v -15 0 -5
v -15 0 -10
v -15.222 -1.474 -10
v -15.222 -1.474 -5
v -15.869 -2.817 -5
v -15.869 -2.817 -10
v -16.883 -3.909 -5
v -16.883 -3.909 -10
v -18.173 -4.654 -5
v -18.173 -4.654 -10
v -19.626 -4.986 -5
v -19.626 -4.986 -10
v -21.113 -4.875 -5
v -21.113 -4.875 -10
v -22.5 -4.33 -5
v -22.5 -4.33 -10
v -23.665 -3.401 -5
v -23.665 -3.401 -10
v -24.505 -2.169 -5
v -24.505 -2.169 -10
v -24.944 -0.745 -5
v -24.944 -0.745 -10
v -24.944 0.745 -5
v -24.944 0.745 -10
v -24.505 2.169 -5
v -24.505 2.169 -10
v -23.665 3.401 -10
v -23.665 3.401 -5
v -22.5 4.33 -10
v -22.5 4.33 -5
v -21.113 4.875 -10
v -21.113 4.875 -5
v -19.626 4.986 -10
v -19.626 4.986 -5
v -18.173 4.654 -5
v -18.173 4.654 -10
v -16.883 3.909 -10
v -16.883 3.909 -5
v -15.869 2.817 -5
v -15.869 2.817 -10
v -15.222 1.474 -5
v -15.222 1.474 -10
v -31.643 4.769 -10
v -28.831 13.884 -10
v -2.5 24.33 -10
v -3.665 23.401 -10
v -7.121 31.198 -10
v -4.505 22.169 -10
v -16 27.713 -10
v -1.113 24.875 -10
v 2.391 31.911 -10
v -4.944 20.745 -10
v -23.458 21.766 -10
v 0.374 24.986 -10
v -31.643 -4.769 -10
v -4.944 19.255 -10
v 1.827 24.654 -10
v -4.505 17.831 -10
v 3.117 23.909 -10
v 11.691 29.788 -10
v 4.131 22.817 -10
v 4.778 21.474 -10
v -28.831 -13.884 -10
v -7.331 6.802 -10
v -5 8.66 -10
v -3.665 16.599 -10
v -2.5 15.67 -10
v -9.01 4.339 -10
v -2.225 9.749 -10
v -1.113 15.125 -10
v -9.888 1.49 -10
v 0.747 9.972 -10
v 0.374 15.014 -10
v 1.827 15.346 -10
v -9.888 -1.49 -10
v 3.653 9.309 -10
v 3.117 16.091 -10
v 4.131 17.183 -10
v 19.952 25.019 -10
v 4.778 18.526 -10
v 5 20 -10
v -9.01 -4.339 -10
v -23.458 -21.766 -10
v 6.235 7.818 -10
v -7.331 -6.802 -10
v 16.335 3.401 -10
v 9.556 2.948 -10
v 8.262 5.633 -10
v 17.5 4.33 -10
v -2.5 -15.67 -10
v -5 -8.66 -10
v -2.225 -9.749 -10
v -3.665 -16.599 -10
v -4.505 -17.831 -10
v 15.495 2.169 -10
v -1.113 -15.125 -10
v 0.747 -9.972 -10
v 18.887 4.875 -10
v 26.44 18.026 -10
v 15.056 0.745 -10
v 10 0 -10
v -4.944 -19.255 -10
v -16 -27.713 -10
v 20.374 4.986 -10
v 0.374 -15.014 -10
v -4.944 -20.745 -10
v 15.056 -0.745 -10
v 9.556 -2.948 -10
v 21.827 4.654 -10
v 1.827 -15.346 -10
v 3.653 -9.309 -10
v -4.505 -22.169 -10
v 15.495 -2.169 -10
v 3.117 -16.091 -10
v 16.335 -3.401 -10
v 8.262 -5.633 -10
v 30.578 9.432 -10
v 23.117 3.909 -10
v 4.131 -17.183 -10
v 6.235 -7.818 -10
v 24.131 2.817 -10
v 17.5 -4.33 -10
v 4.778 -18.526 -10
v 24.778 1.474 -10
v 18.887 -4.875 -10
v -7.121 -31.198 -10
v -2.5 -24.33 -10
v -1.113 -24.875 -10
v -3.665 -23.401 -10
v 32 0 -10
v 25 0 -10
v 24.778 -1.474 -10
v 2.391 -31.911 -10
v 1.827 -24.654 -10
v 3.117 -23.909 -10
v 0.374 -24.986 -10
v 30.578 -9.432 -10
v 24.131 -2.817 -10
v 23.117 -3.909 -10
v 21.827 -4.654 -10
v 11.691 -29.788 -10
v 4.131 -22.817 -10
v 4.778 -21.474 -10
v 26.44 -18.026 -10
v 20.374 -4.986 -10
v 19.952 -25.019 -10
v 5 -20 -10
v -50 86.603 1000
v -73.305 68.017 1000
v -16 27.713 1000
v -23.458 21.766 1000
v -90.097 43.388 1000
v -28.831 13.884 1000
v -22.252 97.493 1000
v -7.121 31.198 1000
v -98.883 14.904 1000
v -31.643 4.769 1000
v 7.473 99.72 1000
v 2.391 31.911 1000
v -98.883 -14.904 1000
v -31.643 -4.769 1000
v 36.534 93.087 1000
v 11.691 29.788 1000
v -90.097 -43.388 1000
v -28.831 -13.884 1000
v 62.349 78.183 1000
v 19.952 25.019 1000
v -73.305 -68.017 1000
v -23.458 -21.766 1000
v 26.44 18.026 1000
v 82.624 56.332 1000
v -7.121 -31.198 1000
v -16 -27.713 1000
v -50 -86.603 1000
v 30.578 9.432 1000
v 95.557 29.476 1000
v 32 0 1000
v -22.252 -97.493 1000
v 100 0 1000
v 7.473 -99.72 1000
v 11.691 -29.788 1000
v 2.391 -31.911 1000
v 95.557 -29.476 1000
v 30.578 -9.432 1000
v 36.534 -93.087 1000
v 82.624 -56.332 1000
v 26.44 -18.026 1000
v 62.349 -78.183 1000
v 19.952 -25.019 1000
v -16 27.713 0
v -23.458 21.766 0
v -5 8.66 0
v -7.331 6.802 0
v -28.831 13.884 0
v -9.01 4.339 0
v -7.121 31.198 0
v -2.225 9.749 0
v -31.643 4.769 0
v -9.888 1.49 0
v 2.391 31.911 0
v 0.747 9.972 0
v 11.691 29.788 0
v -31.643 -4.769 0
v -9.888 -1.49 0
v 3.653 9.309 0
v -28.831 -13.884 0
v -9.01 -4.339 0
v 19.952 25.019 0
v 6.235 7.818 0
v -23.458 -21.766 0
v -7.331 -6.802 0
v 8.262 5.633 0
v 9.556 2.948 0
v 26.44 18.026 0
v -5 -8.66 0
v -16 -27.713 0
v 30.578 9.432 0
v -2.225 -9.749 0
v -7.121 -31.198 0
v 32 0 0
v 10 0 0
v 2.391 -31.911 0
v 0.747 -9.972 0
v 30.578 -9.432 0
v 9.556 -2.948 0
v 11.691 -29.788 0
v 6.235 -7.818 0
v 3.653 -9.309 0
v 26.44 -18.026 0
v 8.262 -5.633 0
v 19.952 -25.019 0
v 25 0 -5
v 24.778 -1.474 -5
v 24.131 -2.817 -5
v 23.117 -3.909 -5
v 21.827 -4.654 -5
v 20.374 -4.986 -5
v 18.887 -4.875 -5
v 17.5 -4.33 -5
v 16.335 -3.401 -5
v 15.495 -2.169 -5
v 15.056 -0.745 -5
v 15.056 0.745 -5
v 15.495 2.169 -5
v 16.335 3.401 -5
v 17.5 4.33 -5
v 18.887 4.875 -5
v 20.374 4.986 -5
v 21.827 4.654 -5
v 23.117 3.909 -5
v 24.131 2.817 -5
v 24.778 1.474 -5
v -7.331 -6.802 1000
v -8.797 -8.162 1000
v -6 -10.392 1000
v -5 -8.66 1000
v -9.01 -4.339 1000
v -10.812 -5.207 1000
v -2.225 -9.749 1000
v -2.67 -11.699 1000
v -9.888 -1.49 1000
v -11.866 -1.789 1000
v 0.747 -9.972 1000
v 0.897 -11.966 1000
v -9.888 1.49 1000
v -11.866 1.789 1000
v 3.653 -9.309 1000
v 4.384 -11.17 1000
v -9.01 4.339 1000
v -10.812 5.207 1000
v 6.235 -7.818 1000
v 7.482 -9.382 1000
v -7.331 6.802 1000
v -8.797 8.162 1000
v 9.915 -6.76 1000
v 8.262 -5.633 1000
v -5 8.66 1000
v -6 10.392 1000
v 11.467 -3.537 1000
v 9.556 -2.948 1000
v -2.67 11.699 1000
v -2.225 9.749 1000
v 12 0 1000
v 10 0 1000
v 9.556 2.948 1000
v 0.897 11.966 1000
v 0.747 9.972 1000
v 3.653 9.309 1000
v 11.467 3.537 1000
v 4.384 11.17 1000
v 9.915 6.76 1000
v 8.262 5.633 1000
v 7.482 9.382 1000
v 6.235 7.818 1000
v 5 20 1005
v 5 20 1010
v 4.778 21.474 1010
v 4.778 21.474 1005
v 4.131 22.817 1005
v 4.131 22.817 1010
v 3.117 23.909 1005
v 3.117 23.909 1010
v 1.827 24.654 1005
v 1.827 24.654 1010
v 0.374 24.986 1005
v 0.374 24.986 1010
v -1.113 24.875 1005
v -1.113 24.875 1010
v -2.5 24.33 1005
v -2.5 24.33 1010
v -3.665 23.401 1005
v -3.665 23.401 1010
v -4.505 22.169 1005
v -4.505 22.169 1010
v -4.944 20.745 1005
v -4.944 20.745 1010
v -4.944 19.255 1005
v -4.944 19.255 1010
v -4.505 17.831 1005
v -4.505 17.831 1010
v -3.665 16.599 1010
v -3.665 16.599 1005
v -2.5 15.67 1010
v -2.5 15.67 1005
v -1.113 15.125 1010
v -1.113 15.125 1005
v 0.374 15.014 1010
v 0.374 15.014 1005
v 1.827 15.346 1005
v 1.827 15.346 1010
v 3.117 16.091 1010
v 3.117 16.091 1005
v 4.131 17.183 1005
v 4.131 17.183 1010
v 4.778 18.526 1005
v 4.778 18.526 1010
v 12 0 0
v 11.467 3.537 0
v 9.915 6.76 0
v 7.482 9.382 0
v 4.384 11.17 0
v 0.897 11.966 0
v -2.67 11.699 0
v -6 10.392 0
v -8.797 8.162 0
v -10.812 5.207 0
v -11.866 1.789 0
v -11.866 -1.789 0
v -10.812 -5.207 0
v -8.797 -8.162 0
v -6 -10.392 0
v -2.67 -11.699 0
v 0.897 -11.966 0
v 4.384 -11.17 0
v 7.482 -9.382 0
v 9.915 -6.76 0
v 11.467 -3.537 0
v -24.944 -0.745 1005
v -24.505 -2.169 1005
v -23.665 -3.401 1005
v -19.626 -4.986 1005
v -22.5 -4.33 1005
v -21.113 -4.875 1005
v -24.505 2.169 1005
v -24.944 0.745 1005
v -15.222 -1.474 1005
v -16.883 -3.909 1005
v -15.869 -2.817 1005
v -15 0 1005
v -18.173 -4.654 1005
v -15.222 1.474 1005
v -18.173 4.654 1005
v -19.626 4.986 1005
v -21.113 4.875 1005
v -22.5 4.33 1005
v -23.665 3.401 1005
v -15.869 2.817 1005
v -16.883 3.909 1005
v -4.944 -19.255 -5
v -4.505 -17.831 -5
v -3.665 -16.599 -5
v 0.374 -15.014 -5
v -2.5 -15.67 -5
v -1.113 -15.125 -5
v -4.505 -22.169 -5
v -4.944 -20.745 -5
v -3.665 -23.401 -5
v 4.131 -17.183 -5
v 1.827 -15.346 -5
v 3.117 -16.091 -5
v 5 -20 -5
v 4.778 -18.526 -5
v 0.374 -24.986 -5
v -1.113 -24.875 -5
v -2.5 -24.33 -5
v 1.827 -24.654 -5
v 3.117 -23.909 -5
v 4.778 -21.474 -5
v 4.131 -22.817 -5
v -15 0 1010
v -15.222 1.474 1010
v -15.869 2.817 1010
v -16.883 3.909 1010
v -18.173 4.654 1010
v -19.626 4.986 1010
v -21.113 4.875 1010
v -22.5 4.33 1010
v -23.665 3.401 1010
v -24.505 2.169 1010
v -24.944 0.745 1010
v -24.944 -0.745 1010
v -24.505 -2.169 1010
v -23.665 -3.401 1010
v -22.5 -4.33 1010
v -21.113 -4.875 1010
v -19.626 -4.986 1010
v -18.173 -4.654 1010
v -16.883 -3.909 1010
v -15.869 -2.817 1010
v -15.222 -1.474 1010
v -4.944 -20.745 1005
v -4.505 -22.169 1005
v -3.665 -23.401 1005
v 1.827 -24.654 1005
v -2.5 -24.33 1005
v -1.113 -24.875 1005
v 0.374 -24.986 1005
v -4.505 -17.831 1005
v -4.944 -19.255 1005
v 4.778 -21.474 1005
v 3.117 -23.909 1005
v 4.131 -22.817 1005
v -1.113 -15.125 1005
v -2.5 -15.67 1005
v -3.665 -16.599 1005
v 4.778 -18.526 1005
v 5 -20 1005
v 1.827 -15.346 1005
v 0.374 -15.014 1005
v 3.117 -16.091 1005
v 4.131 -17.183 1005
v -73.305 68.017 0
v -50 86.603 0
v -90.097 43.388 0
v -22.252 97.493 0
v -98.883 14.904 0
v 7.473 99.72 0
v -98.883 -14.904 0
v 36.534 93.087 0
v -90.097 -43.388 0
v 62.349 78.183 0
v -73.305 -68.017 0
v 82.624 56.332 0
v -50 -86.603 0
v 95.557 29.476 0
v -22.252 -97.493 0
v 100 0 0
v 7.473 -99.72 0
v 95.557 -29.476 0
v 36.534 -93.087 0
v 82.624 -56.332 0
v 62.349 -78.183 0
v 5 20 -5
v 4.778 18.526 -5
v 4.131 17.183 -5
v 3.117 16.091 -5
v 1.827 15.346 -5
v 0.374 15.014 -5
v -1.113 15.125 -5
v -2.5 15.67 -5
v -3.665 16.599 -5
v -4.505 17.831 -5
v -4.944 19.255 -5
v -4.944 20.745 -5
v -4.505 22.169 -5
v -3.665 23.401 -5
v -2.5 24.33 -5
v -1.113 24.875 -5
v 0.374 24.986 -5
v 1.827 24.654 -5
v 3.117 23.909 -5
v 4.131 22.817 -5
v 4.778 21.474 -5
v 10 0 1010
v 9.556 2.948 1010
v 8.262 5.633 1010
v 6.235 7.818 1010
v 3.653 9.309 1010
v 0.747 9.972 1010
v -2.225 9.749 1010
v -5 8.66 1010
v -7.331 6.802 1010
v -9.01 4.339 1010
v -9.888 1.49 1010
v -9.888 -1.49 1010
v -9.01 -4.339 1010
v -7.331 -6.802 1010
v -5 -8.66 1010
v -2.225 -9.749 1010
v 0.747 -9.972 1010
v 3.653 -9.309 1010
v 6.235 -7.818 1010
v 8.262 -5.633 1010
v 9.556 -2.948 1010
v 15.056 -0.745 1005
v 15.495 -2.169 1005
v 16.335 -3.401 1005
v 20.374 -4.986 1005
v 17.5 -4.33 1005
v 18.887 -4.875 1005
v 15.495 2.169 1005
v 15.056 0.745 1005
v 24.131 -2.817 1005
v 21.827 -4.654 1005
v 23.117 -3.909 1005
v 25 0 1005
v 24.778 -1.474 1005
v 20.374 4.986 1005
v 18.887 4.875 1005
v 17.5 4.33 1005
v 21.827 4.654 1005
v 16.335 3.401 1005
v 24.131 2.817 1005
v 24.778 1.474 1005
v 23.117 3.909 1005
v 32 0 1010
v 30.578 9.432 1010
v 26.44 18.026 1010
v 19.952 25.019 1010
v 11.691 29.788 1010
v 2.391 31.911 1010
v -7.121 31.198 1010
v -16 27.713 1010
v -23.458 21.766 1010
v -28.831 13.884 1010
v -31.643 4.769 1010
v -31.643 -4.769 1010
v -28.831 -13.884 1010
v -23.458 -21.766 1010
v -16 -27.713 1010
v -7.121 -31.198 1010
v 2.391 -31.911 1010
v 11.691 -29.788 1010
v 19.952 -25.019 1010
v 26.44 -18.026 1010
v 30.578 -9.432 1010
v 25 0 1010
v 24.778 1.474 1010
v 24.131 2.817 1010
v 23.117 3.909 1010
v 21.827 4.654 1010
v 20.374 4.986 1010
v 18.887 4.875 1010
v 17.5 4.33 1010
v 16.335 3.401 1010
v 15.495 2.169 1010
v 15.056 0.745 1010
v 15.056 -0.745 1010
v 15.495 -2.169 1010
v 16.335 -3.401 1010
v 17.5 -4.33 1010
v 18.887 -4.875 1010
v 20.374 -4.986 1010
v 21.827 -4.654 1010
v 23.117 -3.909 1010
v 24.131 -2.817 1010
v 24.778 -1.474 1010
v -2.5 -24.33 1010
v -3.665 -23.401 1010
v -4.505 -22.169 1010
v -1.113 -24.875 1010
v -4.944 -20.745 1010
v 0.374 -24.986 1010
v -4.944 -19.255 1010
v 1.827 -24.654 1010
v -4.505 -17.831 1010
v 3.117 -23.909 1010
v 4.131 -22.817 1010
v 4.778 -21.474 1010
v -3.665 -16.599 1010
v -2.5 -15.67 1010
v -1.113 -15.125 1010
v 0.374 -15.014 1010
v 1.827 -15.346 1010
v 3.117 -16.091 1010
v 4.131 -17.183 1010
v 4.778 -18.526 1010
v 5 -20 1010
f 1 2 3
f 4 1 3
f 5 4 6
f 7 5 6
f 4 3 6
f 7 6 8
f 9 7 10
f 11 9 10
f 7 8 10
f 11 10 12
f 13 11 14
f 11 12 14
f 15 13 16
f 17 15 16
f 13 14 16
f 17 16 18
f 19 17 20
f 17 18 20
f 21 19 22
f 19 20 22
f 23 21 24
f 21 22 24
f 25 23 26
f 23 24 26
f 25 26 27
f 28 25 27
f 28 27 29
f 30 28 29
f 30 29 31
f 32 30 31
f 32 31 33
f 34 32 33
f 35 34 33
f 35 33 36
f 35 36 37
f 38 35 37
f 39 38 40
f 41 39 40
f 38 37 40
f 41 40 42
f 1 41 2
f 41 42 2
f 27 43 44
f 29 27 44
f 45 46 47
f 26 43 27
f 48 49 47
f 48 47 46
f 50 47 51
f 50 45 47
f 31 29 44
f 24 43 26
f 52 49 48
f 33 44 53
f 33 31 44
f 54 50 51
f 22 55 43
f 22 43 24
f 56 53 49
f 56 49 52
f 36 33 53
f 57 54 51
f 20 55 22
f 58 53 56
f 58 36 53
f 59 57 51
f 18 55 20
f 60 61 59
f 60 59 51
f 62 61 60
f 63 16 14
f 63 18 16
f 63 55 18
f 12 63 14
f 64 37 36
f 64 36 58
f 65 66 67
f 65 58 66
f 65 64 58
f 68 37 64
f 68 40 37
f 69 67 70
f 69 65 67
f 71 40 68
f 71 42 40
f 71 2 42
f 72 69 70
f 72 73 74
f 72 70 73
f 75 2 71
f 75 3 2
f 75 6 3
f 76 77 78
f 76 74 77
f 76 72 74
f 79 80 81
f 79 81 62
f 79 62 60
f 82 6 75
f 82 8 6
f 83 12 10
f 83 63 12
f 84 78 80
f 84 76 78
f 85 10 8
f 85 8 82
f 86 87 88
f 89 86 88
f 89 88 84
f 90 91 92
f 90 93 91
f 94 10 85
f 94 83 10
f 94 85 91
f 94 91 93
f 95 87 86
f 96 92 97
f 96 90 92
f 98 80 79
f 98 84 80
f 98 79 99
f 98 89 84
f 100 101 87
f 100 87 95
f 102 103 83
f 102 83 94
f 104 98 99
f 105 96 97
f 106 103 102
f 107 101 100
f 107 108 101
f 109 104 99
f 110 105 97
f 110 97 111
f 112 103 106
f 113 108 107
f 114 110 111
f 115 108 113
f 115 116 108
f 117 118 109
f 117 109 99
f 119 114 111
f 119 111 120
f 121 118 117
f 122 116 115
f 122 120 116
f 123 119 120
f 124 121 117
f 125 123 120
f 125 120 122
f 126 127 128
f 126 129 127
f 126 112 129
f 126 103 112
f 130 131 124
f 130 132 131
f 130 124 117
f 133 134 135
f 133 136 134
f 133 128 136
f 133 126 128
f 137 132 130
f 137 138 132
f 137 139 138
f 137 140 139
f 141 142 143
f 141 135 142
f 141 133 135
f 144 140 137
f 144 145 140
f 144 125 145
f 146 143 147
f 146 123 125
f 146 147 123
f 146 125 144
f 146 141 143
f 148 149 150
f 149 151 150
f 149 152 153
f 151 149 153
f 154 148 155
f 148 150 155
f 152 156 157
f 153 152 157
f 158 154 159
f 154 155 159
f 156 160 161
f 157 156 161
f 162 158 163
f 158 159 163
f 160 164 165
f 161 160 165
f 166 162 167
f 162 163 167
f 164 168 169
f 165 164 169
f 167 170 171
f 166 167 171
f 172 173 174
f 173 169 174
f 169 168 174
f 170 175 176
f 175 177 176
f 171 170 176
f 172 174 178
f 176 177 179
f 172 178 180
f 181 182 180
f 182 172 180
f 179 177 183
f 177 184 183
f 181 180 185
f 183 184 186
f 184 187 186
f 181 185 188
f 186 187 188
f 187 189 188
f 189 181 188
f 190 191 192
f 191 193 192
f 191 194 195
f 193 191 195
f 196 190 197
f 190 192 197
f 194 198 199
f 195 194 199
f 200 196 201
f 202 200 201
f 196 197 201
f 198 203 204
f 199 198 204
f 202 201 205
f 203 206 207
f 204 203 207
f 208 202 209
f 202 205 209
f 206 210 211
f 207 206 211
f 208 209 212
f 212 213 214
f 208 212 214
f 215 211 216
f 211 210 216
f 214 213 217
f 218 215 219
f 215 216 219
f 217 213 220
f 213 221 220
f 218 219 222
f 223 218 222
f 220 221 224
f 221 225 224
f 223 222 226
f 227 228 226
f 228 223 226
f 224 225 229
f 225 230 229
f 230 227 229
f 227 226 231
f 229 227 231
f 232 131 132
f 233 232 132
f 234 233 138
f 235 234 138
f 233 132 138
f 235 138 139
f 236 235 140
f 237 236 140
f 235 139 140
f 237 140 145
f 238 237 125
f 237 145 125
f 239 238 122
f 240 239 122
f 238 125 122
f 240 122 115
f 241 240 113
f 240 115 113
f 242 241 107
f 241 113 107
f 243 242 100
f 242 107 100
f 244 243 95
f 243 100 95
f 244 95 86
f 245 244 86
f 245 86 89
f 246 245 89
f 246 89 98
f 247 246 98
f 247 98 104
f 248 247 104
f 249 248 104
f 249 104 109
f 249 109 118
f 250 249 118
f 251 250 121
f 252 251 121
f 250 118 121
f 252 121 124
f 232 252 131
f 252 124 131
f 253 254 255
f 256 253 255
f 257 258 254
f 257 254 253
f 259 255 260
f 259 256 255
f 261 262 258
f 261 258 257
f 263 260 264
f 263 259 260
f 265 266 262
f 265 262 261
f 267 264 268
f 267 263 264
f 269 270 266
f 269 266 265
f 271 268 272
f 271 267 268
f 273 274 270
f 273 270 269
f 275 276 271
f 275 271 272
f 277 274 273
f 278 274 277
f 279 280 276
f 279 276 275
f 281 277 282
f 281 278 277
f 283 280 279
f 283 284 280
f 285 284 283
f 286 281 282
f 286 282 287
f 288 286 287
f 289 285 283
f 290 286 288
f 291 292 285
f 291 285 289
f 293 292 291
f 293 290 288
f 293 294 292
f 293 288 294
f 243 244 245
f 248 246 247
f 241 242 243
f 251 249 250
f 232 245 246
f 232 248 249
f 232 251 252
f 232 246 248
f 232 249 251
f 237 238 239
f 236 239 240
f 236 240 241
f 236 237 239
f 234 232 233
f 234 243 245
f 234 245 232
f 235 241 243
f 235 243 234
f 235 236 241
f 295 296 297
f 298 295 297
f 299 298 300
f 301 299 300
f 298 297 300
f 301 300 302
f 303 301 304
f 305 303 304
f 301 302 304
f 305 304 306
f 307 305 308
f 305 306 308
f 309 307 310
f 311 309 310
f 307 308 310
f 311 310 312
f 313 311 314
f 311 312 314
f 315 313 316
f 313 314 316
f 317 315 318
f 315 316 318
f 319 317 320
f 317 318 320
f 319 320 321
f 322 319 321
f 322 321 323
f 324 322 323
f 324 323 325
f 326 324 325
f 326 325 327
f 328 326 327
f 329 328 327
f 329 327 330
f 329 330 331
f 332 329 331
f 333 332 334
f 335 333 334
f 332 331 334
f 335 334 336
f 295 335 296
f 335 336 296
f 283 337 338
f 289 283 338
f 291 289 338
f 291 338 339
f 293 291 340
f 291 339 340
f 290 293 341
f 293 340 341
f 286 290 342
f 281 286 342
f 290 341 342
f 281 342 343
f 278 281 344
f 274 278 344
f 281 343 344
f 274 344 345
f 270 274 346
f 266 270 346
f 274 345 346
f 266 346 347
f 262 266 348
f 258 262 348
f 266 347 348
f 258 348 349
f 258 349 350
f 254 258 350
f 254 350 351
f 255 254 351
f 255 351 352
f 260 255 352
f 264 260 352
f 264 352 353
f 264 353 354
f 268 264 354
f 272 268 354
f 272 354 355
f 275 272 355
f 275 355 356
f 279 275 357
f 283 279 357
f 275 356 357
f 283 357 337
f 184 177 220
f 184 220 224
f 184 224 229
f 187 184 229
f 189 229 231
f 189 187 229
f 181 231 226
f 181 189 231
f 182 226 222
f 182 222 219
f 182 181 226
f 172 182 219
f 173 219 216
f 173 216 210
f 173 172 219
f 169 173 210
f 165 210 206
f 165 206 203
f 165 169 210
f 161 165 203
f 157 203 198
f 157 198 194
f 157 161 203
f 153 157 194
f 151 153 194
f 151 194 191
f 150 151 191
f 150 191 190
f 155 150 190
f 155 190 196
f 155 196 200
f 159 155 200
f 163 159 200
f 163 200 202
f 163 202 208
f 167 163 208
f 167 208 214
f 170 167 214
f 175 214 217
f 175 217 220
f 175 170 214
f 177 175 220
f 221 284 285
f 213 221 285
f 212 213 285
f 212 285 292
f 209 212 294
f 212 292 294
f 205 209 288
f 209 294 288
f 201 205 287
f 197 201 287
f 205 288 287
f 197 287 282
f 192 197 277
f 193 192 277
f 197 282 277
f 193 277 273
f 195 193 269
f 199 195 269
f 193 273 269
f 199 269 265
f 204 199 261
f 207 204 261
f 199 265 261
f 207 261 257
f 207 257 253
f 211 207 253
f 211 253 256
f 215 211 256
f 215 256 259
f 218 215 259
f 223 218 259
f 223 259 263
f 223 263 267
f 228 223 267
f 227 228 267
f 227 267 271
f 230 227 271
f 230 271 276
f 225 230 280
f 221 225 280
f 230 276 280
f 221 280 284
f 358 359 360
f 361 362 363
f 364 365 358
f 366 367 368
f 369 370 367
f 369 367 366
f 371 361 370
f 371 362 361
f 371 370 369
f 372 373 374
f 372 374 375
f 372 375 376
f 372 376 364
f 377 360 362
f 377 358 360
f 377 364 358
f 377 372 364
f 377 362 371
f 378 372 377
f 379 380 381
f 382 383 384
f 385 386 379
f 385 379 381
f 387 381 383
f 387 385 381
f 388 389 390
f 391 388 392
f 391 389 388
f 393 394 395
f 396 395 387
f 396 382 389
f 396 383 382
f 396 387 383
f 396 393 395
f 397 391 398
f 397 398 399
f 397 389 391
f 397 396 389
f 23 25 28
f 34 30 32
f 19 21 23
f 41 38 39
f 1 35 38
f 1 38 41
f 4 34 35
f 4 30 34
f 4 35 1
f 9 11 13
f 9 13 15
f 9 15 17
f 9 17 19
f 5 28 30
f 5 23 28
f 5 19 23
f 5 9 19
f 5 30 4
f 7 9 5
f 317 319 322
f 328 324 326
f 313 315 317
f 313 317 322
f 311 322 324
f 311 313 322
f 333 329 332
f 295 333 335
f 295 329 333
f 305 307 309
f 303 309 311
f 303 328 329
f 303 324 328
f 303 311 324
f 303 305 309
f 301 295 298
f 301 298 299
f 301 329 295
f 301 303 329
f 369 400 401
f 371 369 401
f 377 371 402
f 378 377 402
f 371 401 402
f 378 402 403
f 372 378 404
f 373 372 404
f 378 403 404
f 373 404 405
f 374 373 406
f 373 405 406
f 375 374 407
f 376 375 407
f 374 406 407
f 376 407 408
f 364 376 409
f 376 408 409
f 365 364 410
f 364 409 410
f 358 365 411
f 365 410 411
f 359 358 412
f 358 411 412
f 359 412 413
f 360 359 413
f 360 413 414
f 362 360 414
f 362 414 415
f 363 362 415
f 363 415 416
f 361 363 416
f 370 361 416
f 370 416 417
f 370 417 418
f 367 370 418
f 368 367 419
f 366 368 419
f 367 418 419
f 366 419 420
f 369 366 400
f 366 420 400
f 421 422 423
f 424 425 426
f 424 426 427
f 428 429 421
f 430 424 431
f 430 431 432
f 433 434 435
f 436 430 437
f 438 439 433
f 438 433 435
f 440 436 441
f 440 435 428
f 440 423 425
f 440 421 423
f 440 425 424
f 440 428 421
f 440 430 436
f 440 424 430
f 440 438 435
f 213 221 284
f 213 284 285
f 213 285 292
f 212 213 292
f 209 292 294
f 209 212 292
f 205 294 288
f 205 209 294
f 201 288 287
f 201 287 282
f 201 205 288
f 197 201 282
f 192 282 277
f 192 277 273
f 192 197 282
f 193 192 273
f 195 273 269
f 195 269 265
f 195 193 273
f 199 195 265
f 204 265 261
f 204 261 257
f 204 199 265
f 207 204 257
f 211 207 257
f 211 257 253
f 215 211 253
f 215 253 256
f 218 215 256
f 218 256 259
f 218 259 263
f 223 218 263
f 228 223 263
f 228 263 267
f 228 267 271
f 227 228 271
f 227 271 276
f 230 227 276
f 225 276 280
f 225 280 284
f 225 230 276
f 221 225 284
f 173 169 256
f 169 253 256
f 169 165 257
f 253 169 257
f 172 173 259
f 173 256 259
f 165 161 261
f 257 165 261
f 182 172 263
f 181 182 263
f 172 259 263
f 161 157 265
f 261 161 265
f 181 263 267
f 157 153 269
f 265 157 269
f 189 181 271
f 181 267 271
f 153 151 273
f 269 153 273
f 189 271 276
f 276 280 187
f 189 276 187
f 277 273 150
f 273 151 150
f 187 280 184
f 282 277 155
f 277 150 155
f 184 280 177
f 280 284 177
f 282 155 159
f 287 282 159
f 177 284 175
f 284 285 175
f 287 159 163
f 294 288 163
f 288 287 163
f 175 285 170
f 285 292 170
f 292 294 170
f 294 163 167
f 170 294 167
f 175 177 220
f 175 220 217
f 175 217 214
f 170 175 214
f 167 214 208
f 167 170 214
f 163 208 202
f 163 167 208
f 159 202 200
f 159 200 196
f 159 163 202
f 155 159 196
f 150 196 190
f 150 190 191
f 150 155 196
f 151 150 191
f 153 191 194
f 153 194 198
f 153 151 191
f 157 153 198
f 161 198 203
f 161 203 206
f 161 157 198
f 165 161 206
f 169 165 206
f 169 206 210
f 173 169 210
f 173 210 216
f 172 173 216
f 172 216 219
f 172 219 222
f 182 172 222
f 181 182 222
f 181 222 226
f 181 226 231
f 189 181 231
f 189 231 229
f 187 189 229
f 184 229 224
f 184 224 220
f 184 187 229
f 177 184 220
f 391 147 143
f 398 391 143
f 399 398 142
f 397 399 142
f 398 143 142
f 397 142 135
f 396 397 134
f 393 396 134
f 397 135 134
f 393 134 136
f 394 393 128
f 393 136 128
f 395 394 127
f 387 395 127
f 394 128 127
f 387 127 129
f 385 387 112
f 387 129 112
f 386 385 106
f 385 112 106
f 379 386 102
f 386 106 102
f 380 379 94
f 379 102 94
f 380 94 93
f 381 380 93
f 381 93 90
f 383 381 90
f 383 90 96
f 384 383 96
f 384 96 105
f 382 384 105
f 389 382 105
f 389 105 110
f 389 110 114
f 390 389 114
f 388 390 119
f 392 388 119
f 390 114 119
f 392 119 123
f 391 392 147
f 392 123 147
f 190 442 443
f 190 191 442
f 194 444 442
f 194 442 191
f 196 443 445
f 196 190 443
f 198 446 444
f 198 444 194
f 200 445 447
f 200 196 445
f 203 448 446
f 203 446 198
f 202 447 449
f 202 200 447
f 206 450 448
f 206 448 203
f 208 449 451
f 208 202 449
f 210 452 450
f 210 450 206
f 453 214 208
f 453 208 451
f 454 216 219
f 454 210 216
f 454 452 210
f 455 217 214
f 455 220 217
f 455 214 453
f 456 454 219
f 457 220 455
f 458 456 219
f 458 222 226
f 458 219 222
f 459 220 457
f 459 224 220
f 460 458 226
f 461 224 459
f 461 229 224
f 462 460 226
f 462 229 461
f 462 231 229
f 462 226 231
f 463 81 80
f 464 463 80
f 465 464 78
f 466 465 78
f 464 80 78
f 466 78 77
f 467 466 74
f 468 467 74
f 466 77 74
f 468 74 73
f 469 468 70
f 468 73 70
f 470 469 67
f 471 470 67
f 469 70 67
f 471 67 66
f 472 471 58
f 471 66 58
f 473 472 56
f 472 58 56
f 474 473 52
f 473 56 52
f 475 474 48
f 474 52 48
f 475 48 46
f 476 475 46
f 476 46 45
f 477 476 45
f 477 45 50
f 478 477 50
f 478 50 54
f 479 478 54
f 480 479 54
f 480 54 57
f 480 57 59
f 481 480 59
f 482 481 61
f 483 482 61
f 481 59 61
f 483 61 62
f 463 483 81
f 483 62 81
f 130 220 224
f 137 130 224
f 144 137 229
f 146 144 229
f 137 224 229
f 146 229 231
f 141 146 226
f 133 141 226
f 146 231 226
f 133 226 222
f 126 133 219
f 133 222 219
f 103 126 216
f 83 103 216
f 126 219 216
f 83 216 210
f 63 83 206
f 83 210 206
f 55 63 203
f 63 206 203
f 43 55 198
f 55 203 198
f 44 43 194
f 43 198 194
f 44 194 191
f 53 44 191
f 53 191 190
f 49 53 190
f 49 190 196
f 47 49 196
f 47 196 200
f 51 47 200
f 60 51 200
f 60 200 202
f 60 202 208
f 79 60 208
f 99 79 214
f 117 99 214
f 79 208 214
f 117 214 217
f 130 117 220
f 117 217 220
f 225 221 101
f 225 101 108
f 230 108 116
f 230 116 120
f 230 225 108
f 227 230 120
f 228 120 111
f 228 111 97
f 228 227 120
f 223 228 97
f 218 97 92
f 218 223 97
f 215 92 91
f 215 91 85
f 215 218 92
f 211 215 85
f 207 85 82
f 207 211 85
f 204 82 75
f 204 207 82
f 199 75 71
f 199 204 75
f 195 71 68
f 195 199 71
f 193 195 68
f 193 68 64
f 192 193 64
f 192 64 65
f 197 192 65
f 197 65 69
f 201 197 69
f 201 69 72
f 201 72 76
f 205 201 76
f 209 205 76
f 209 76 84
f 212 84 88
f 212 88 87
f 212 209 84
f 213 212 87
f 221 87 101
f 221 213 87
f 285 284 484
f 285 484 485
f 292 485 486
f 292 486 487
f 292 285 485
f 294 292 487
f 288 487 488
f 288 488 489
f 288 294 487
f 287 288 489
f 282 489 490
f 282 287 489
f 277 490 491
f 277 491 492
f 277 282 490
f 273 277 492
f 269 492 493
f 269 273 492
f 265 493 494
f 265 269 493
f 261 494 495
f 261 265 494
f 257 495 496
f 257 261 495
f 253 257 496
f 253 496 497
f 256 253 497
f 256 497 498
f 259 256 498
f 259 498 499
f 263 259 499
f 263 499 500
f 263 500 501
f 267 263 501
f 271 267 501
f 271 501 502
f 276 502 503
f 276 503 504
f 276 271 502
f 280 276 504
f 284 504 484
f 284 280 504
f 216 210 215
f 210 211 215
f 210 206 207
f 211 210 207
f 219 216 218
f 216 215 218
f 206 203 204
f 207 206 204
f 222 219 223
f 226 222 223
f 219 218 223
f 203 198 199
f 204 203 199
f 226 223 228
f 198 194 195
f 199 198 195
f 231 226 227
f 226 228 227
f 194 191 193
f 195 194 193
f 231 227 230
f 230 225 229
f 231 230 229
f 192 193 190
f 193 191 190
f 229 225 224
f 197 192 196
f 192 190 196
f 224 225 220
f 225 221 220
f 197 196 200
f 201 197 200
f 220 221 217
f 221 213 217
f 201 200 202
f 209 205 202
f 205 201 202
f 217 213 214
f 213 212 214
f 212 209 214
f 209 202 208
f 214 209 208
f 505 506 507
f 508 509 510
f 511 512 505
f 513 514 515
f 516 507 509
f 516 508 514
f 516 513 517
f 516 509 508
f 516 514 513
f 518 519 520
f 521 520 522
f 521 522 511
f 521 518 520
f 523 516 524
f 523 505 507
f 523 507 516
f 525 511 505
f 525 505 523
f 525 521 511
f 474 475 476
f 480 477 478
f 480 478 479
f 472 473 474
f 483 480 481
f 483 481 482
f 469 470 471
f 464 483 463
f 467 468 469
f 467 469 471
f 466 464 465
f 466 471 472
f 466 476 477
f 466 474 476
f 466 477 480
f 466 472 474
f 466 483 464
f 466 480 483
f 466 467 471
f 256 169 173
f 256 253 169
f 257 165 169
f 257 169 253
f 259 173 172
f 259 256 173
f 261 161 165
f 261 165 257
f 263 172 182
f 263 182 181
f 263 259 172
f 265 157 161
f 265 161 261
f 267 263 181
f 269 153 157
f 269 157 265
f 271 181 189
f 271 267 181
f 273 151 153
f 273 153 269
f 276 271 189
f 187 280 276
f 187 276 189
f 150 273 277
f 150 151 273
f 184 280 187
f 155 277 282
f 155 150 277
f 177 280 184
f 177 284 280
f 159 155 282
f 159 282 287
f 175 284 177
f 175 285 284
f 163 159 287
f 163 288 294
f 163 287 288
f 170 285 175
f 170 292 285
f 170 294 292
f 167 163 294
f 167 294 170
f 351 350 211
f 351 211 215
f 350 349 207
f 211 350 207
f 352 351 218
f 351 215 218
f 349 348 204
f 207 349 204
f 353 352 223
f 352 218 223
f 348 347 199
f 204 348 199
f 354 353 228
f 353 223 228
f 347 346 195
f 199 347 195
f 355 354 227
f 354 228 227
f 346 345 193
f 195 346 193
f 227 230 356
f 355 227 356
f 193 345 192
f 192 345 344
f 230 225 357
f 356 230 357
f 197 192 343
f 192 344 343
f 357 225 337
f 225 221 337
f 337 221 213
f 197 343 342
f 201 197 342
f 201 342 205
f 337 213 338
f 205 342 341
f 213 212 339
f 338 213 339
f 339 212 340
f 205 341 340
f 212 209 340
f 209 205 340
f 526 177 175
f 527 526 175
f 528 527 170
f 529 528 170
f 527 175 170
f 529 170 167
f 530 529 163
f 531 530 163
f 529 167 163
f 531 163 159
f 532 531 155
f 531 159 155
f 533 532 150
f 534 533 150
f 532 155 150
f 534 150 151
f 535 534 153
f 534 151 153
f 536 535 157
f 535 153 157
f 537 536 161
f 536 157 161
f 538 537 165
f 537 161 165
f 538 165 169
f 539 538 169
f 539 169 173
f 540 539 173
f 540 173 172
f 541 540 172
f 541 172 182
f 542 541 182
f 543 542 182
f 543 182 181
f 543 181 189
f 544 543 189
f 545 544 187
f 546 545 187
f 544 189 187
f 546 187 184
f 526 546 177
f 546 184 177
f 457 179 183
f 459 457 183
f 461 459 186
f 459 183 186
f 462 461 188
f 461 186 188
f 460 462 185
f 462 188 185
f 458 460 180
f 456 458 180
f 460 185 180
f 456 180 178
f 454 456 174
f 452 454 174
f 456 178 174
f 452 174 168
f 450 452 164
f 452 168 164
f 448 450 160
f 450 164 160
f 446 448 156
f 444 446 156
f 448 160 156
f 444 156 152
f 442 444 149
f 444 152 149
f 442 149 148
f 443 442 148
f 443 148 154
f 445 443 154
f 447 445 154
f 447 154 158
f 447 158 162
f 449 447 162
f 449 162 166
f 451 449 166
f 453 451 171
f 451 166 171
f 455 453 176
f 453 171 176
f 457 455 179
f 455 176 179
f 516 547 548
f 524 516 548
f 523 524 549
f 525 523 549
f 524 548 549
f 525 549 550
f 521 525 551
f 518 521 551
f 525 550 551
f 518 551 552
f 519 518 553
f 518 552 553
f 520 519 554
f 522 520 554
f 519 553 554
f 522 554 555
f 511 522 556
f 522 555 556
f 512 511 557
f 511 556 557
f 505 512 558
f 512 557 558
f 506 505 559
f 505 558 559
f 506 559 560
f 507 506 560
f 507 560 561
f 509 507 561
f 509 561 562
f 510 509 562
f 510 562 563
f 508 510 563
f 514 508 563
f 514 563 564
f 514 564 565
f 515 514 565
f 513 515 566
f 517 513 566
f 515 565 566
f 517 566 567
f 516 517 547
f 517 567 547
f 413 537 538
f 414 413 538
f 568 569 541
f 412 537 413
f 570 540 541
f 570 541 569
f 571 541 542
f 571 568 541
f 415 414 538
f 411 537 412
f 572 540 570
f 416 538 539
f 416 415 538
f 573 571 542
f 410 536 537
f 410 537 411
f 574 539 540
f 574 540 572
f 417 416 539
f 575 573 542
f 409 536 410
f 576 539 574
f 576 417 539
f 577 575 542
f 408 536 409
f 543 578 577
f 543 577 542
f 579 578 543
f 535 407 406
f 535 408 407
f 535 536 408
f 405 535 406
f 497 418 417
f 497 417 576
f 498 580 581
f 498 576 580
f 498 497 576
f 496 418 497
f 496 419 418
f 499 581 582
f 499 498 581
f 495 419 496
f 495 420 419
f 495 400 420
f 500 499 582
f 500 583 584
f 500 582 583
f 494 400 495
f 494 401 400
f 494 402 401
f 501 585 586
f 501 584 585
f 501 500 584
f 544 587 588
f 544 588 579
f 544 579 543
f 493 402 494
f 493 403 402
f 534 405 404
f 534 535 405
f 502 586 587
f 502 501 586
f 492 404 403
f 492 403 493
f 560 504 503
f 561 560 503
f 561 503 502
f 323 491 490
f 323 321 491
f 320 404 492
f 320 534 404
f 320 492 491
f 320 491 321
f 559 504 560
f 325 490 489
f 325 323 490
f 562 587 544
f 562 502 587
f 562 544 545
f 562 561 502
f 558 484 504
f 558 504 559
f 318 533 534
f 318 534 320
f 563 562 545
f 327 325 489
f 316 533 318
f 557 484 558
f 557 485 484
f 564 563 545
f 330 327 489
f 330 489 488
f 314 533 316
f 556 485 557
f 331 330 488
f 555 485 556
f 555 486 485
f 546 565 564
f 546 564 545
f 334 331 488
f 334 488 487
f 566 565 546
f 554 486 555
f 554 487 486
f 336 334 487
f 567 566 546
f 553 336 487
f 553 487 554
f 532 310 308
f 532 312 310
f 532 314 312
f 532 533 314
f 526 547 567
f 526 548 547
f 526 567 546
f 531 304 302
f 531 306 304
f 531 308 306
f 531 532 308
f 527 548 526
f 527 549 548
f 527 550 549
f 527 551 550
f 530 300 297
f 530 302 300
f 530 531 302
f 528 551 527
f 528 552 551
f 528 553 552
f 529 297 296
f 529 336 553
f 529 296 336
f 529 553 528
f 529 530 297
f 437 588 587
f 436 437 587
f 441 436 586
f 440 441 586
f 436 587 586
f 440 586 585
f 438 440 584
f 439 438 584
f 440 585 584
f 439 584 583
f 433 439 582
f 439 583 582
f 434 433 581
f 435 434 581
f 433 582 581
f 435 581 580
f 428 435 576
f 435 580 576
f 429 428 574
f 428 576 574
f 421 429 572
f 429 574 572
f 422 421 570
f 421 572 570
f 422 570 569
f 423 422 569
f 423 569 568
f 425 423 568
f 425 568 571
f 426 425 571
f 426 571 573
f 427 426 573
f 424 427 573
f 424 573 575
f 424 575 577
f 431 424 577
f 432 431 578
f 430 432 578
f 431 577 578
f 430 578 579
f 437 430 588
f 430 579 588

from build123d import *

# Parameters (mm, degrees)
F0_R      = 12
F0_R_2    = 10
F1_DEPTH  = 1000
F2_R      = 32
F2_R_2    = 12
F2_R_3    = 10
F3_DEPTH  = 10
F4_R      = 32
F4_R_2    = 12
F4_R_3    = 10
F5_DEPTH  = 10
F6_DEPTH  = 1000
F7_R      = 5
F8_DEPTH  = 5
F9_R      = 5
F10_DEPTH = 5
F11_R     = 100
F11_R_2   = 32
F12_DEPTH = 1000


with BuildPart() as f1:
    # F0 (on Top) → F1 (new body)
    with BuildSketch(Plane.XY):
        Circle(F0_R)
        Circle(F0_R_2, mode=Mode.SUBTRACT)
    extrude(amount=F1_DEPTH)


with BuildPart() as f3:
    # F2 (on face) → F3 (new body)
    with BuildSketch(Plane.XY.offset(1000)):
        Circle(F2_R)
        Circle(F2_R_2, mode=Mode.SUBTRACT)
        Circle(F2_R_2)
        Circle(F2_R_3, mode=Mode.SUBTRACT)
    extrude(amount=F3_DEPTH)


with BuildPart() as f5:
    # F4 (on face) → F5 (new body)
    with BuildSketch(Plane(origin=(0, 0, 0), x_dir=(1, 0, 0), z_dir=(0, 0, -1))):
        Circle(F4_R)
        Circle(F4_R_2, mode=Mode.SUBTRACT)
        Circle(F4_R_2)
        Circle(F4_R_3, mode=Mode.SUBTRACT)
    extrude(amount=F5_DEPTH)

    # F7 (on face) → F8 (cut)
    with BuildSketch(Plane(origin=(0, 0, -10), x_dir=(1, 0, 0), z_dir=(0, 0, -1))):
        with Locations((0, 20)):
            Circle(F7_R)
        with Locations((-20, 0)):
            Circle(F7_R)
        with Locations((0, -20)):
            Circle(F7_R)
        with Locations((20, 0)):
            Circle(F7_R)
    extrude(amount=-F8_DEPTH, mode=Mode.SUBTRACT)


with BuildPart() as f6:
    # F6 (new, through all): a face of the model
    f6_faces = [f3.part.faces().sort_by_distance(p)[0] for p in [
        (-31.0949033201, 0, 1000),
    ]]
    extrude(f6_faces, amount=F6_DEPTH)


with BuildPart() as f3_1:
    add(f3.part)

    # F9 (on face) → F10 (cut)
    with BuildSketch(Plane.XY.offset(1010)):
        with Locations((0, 20)):
            Circle(F9_R)
        with Locations((-20, 0)):
            Circle(F9_R)
        with Locations((0, -20)):
            Circle(F9_R)
        with Locations((20, 0)):
            Circle(F9_R)
    extrude(amount=-F10_DEPTH, mode=Mode.SUBTRACT)


with BuildPart() as f12:
    # F11 (on face) → F12 (new body, through all)
    with BuildSketch(Plane(origin=(0, 0, 1000), x_dir=(1, 0, 0), z_dir=(0, 0, -1))):
        Circle(F11_R)
        Circle(F11_R_2, mode=Mode.SUBTRACT)
    extrude(amount=F12_DEPTH)


solid = Compound([f1.part, f5.part, f6.part, f3_1.part, f12.part])
